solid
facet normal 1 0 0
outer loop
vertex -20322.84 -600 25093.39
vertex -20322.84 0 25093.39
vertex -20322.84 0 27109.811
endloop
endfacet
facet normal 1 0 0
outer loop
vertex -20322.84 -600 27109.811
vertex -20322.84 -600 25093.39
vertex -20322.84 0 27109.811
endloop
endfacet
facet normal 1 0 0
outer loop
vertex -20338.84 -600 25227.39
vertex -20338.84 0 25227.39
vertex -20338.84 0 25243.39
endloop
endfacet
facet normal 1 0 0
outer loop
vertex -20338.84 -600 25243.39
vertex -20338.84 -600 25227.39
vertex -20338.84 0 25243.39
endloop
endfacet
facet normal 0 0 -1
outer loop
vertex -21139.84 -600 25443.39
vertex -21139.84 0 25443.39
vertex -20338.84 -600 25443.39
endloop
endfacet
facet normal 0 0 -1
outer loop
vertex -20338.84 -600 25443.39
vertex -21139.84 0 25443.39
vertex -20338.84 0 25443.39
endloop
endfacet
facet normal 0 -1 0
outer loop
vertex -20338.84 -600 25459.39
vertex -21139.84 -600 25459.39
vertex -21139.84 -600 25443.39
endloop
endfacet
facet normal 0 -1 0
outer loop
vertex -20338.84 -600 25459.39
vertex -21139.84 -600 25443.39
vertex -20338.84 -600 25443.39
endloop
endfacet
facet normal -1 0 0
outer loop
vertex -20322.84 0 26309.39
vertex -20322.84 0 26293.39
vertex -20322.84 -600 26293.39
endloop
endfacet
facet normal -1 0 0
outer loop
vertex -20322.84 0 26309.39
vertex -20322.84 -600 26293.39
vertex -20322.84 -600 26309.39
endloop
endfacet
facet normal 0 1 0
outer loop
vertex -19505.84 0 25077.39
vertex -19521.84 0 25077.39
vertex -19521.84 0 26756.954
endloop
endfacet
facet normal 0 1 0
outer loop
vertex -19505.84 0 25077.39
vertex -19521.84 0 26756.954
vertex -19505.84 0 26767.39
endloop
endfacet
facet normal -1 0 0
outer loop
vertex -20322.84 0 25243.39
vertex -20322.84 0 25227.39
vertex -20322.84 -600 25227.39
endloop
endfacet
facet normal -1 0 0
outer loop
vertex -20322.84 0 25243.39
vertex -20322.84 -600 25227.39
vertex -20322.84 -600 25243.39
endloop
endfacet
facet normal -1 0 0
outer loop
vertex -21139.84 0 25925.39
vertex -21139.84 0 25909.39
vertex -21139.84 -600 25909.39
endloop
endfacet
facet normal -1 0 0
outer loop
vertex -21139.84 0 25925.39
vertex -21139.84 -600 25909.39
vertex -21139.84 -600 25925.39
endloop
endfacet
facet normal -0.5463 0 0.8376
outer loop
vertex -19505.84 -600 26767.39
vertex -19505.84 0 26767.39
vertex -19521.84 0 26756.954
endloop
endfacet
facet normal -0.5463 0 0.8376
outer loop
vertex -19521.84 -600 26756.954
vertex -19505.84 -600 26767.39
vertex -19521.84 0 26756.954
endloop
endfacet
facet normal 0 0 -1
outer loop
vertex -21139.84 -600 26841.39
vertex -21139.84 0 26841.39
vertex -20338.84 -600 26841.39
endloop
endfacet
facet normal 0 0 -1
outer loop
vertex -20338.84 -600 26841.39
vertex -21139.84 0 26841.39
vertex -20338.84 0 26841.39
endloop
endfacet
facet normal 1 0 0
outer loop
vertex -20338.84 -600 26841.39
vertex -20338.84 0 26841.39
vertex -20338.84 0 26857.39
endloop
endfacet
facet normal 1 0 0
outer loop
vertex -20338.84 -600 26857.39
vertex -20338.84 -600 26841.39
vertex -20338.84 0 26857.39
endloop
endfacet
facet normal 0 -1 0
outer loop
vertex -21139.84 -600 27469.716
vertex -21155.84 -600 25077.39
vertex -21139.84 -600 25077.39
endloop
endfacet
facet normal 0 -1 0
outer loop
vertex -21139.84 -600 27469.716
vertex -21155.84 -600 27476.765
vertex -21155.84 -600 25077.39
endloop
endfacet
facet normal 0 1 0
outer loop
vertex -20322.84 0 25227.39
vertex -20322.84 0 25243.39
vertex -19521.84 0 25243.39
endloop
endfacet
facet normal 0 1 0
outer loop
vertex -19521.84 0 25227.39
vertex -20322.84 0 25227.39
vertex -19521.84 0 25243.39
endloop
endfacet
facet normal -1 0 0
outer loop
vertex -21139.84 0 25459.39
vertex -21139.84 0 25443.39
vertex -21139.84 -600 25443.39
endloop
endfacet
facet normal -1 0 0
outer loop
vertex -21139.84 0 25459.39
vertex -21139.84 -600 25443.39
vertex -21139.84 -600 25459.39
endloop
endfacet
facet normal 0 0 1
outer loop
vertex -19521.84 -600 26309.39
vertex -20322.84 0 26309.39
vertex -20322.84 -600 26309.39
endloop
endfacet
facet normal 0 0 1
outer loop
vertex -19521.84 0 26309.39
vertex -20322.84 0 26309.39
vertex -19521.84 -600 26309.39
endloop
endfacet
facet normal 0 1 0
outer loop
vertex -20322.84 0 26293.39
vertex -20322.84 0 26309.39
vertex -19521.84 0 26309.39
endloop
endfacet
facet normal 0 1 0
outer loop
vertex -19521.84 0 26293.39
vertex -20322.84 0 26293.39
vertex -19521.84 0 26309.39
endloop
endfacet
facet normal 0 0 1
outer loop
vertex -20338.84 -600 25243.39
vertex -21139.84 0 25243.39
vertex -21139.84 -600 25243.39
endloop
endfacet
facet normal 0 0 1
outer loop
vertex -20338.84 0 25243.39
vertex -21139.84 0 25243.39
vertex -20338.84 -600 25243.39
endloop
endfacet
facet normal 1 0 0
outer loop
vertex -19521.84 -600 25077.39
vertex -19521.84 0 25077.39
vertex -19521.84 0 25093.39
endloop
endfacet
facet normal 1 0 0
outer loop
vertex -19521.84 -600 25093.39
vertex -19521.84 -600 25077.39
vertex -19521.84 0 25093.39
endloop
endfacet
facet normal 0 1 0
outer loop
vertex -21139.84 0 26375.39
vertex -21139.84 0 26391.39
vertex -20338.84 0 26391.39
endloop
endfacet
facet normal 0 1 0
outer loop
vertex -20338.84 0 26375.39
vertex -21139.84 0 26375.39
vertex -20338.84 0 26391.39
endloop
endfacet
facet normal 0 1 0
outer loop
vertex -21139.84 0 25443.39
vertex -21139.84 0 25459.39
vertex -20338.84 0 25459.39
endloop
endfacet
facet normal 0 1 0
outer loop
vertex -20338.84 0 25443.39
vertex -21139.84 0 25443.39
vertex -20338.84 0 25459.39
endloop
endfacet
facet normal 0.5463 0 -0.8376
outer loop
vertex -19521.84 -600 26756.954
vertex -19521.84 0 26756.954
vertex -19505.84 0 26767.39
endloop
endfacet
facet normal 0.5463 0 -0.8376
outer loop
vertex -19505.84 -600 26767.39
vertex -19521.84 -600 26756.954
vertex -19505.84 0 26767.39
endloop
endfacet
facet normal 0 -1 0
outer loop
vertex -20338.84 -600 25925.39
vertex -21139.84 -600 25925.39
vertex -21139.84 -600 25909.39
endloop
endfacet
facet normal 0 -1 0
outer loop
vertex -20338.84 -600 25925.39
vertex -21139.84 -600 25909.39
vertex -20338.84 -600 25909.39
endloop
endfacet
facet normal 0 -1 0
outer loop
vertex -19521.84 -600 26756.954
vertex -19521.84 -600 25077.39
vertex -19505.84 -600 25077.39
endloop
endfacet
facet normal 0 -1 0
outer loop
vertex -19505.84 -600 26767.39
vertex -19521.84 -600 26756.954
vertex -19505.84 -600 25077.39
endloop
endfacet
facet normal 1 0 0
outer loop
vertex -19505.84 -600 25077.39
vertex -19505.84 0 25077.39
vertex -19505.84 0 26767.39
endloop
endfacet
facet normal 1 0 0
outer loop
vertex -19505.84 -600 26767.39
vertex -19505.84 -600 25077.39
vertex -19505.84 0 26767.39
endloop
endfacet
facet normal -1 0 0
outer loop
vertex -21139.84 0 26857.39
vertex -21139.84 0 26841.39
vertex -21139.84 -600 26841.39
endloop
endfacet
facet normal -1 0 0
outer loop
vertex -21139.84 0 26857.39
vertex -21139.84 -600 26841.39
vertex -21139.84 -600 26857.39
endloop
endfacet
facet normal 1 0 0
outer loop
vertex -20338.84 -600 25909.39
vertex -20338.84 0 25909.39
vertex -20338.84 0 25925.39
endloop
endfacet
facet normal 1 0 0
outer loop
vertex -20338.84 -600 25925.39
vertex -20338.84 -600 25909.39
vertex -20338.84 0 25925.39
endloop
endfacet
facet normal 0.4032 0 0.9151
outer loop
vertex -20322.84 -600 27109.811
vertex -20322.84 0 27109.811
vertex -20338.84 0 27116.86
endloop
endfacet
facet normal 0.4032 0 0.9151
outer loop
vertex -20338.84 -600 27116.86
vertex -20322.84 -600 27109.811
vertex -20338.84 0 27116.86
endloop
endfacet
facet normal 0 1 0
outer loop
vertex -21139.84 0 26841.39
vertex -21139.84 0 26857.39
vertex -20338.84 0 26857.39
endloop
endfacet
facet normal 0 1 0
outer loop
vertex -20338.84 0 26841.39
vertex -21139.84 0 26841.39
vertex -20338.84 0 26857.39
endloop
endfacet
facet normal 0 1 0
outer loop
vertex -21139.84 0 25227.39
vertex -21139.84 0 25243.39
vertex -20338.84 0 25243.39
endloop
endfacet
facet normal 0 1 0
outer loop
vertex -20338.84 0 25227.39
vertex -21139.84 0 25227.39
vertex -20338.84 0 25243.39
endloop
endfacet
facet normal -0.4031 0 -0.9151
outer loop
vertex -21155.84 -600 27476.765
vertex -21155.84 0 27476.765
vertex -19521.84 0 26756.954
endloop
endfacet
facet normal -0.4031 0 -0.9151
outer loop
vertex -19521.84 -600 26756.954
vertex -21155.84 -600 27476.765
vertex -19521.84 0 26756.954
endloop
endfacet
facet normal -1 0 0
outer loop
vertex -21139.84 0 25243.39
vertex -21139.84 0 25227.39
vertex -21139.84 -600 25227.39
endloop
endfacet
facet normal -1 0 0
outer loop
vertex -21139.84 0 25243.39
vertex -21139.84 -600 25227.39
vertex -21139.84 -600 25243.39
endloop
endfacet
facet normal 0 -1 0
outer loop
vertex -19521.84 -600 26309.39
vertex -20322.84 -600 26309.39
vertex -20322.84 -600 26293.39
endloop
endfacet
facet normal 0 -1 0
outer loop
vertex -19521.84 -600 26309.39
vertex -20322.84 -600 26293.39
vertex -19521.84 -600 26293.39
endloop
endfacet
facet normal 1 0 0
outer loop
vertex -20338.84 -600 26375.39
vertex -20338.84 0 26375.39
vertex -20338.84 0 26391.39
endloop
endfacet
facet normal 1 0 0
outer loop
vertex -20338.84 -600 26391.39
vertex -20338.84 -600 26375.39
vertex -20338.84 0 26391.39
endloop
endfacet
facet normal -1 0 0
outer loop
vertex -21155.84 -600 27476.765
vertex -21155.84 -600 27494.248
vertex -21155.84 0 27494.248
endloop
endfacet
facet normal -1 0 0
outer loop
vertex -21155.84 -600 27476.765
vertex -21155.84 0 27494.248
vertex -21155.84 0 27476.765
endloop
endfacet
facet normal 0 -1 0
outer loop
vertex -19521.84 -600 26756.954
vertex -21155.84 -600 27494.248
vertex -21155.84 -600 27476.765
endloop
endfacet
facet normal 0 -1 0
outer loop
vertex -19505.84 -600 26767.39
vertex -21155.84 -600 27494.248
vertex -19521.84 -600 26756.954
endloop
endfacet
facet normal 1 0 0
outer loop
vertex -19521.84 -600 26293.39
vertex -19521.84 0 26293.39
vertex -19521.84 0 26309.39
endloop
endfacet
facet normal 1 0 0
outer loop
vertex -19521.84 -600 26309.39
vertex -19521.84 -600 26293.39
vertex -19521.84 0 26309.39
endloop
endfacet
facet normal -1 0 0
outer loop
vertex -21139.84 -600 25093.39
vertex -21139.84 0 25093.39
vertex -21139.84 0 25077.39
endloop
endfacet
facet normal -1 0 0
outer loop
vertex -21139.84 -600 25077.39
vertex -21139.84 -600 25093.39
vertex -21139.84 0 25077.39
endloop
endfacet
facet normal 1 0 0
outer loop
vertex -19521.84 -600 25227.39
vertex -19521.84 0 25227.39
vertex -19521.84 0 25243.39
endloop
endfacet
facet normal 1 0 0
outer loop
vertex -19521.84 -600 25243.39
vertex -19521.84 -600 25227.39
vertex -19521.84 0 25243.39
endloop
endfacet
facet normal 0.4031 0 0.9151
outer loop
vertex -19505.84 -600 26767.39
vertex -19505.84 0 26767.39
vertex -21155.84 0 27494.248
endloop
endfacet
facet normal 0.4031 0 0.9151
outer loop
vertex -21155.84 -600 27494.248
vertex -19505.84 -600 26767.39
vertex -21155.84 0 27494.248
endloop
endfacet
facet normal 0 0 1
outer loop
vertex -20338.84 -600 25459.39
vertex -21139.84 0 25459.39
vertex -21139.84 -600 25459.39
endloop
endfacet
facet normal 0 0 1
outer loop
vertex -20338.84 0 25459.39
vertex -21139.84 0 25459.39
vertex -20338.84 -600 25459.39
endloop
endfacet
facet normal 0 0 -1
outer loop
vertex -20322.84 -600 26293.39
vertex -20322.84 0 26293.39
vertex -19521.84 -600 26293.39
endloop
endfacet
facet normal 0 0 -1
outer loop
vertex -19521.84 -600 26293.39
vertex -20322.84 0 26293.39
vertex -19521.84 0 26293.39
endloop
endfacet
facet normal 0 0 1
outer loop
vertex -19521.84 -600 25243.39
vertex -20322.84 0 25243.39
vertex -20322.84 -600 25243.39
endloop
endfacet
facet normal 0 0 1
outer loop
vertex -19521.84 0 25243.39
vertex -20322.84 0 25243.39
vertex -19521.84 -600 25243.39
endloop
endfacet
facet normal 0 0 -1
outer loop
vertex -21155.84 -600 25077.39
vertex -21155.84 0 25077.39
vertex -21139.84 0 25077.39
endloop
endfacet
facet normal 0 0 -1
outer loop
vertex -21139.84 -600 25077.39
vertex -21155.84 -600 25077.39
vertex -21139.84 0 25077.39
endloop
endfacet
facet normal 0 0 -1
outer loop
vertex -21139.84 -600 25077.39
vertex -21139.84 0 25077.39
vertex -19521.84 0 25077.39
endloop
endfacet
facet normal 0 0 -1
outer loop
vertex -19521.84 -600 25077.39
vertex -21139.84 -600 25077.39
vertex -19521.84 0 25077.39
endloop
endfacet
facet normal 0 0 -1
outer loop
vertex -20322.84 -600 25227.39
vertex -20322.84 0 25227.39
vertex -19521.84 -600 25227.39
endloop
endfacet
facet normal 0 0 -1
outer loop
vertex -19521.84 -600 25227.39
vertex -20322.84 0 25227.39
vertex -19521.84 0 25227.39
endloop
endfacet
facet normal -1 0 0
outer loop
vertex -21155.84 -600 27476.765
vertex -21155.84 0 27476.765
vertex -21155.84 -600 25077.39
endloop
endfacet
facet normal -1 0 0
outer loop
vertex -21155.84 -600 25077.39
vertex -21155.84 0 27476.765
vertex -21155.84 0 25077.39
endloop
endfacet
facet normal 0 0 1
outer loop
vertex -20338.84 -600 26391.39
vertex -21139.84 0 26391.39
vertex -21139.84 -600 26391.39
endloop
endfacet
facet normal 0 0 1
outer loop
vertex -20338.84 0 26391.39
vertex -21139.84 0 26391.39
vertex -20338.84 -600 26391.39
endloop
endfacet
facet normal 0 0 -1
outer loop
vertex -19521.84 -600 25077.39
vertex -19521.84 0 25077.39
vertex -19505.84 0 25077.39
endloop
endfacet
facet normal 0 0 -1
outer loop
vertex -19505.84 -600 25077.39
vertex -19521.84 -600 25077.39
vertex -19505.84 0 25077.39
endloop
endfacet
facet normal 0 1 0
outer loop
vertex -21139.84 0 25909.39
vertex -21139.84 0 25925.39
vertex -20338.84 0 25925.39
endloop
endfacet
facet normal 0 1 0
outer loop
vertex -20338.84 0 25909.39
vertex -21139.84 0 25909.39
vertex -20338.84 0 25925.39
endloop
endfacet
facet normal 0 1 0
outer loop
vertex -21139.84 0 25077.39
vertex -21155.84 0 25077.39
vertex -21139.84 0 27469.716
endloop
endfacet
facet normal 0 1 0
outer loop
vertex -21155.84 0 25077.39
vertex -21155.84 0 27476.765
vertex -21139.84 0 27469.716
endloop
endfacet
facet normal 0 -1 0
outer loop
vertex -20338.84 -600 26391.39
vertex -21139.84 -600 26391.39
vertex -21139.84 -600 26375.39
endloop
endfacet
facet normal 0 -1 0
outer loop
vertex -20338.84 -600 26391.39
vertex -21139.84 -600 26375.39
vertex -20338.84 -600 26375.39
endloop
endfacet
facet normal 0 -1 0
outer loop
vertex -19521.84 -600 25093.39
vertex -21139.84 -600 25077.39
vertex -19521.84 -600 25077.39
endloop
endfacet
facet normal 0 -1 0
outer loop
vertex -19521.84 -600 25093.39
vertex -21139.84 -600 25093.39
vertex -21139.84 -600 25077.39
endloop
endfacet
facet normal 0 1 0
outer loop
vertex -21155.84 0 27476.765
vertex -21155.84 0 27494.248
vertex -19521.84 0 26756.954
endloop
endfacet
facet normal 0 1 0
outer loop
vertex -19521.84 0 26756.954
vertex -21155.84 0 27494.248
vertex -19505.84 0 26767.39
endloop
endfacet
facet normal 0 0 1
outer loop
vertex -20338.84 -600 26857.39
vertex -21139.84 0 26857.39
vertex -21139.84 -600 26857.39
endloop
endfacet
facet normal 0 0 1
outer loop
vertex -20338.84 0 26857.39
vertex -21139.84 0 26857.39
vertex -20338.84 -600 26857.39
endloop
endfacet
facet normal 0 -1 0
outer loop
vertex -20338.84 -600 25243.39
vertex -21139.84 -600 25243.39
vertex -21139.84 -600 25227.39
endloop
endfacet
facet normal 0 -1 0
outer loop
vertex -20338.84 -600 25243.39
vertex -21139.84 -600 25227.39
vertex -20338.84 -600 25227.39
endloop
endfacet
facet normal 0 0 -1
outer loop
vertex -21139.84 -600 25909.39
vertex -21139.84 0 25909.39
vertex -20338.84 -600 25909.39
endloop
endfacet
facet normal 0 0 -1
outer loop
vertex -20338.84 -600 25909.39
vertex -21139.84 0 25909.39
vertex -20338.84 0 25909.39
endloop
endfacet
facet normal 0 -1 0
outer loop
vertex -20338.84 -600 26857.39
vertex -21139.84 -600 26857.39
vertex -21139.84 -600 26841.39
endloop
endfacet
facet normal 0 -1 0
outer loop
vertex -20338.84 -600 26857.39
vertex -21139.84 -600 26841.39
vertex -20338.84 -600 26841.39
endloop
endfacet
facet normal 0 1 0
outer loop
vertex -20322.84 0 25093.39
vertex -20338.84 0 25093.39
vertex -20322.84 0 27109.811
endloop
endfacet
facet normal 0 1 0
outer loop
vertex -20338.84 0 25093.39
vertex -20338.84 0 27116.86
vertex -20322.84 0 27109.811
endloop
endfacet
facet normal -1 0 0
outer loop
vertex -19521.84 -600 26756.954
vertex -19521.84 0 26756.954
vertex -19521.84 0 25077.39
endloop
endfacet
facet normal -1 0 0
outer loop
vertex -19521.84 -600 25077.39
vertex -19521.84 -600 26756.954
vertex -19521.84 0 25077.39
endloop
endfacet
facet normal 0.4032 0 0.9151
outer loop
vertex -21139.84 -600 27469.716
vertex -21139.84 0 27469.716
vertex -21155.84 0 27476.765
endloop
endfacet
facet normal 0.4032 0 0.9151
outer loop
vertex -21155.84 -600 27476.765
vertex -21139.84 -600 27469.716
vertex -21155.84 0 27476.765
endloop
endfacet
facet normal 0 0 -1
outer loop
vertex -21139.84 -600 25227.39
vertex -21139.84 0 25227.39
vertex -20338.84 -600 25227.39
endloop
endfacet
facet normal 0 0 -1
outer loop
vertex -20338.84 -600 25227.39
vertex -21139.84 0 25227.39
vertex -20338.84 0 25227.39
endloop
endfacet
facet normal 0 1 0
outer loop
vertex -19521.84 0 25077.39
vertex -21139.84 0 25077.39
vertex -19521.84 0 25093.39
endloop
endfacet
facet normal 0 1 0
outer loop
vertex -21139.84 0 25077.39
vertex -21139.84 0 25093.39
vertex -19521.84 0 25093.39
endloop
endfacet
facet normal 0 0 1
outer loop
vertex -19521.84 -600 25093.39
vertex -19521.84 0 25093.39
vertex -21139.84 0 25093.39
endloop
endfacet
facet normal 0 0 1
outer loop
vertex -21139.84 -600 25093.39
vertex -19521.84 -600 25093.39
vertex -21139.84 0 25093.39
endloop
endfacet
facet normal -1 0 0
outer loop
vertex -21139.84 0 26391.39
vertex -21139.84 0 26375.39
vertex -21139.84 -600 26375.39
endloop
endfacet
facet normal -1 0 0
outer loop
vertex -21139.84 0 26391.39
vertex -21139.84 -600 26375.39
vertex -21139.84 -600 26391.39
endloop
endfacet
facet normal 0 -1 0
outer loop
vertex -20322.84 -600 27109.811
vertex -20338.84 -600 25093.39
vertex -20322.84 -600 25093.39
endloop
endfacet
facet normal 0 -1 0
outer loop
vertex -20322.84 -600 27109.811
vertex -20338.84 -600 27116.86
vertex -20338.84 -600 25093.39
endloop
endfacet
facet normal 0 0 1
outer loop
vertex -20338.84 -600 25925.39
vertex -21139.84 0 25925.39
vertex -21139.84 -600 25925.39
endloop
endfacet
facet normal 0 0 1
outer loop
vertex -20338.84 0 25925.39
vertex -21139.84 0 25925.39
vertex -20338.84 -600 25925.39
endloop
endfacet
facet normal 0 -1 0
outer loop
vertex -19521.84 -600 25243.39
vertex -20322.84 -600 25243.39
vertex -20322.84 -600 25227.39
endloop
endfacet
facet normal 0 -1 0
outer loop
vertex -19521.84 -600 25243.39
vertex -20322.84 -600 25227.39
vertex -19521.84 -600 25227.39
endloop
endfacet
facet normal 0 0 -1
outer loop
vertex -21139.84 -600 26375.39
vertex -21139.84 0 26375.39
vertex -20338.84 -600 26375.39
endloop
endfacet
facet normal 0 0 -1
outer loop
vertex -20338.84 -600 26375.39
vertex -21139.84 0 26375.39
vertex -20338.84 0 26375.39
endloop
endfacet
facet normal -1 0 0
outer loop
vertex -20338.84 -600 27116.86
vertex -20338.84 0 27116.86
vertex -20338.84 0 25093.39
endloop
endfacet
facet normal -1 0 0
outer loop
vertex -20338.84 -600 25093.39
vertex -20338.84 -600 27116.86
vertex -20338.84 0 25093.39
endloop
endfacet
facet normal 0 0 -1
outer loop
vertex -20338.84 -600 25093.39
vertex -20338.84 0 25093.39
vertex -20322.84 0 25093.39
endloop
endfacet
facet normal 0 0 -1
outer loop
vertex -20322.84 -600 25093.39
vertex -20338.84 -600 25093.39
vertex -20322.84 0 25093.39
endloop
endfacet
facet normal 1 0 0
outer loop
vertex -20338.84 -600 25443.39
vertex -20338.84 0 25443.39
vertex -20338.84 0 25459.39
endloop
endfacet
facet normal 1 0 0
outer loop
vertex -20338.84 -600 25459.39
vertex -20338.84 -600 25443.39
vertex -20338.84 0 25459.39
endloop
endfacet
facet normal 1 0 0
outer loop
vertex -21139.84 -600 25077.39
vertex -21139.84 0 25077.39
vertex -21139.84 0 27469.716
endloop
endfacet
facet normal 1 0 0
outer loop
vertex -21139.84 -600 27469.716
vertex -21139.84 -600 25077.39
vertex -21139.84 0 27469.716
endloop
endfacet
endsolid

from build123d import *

# Parameters (mm, degrees)
F1_DEPTH = 600
F2_DEPTH = 600
F3_DEPTH = 600
F4_DEPTH = 600
F5_DEPTH = 600
F0_W     = 801
F0_H     = 16
F6_DEPTH = 600


with BuildPart() as f1:
    # F0 (on Front) → F1 (new body)
    with BuildSketch(Plane.XZ):
        Polygon((-21155.8402650225, 25077.389837374), (-21139.8402650225, 25077.389837374), (-21139.8402650225, 25093.389837374), (-21139.8402650225, 25227.389837374), (-21139.8402650225, 25243.389837374), (-21139.8402650225, 25443.389837374), (-21139.8402650225, 25459.389837374), (-21139.8402650225, 25909.389837374), (-21139.8402650225, 25925.389837374), (-21139.8402650225, 26375.389837374), (-21139.8402650225, 26391.389837374), (-21139.8402650225, 26841.389837374), (-21139.8402650225, 26857.389837374), (-21139.8402650225, 27469.716218893), (-21155.8402650225, 27476.7645425729), align=None)
    extrude(amount=F1_DEPTH)


with BuildPart() as f2:
    # F0 (on Front) → F2 (new body)
    with BuildSketch(Plane.XZ):
        Polygon((-19521.8402650225, 26756.9544867634), (-19505.8402650225, 26767.3898373741), (-21155.8402650225, 27494.2482168634), (-21155.8402650225, 27476.7645425729), (-21139.8402650225, 27469.716218893), (-20338.8402650225, 27116.8595146682), (-20322.8402650225, 27109.8111909883), align=None)
    extrude(amount=F2_DEPTH)


with BuildPart() as f3:
    # F0 (on Front) → F3 (new body)
    with BuildSketch(Plane.XZ):
        Polygon((-19521.8402650225, 25077.389837374), (-19505.8402650225, 25077.389837374), (-19505.8402650225, 26767.3898373741), (-19521.8402650225, 26756.9544867634), (-19521.8402650225, 26309.389837374), (-19521.8402650225, 26293.389837374), (-19521.8402650225, 25243.389837374), (-19521.8402650225, 25227.389837374), (-19521.8402650225, 25093.389837374), align=None)
    extrude(amount=F3_DEPTH)


with BuildPart() as f4:
    # F0 (on Front) → F4 (new body)
    with BuildSketch(Plane.XZ):
        Polygon((-21139.8402650225, 25077.389837374), (-19521.8402650225, 25077.389837374), (-19521.8402650225, 25093.389837374), (-20322.8402650225, 25093.389837374), (-20338.8402650225, 25093.389837374), (-21139.8402650225, 25093.389837374), align=None)
    extrude(amount=F4_DEPTH)


with BuildPart() as f5:
    # F0 (on Front) → F5 (new body)
    with BuildSketch(Plane.XZ):
        Polygon((-20338.8402650225, 25093.389837374), (-20322.8402650225, 25093.389837374), (-20322.8402650225, 25227.389837374), (-20322.8402650225, 25243.389837374), (-20322.8402650225, 26293.389837374), (-20322.8402650225, 26309.389837374), (-20322.8402650225, 27109.8111909883), (-20338.8402650225, 27116.8595146682), (-20338.8402650225, 26857.389837374), (-20338.8402650225, 26841.389837374), (-20338.8402650225, 26391.389837374), (-20338.8402650225, 26375.389837374), (-20338.8402650225, 25925.389837374), (-20338.8402650225, 25909.389837374), (-20338.8402650225, 25459.389837374), (-20338.8402650225, 25443.389837374), (-20338.8402650225, 25243.389837374), (-20338.8402650225, 25227.389837374), align=None)
    extrude(amount=F5_DEPTH)


with BuildPart() as f6:
    # F0 (on Front) → F6 (new body)
    with BuildSketch(Plane.XZ):
        with Locations((-20739.3402650225, 25235.389837374)):
            Rectangle(F0_W, F0_H)
    extrude(amount=F6_DEPTH)


with BuildPart() as f6b:
    # F0 (on Front) → F6, piece 2 (new body)
    with BuildSketch(Plane.XZ):
        with Locations((-19922.3402650225, 25235.389837374)):
            Rectangle(F0_W, F0_H)
    extrude(amount=F6_DEPTH)


with BuildPart() as f6c:
    # F0 (on Front) → F6, piece 3 (new body)
    with BuildSketch(Plane.XZ):
        with Locations((-20739.3402650225, 25451.389837374)):
            Rectangle(F0_W, F0_H)
    extrude(amount=F6_DEPTH)


with BuildPart() as f6d:
    # F0 (on Front) → F6, piece 4 (new body)
    with BuildSketch(Plane.XZ):
        with Locations((-20739.3402650225, 25917.389837374)):
            Rectangle(F0_W, F0_H)
    extrude(amount=F6_DEPTH)


with BuildPart() as f6e:
    # F0 (on Front) → F6, piece 5 (new body)
    with BuildSketch(Plane.XZ):
        with Locations((-19922.3402650225, 26301.389837374)):
            Rectangle(F0_W, F0_H)
    extrude(amount=F6_DEPTH)


with BuildPart() as f6f:
    # F0 (on Front) → F6, piece 6 (new body)
    with BuildSketch(Plane.XZ):
        with Locations((-20739.3402650225, 26383.389837374)):
            Rectangle(F0_W, F0_H)
    extrude(amount=F6_DEPTH)


with BuildPart() as f6g:
    # F0 (on Front) → F6, piece 7 (new body)
    with BuildSketch(Plane.XZ):
        with Locations((-20739.3402650225, 26849.389837374)):
            Rectangle(F0_W, F0_H)
    extrude(amount=F6_DEPTH)


solid = Compound([f1.part, f2.part, f3.part, f4.part, f5.part, f6.part, f6b.part, f6c.part, f6d.part, f6e.part, f6f.part, f6g.part])
